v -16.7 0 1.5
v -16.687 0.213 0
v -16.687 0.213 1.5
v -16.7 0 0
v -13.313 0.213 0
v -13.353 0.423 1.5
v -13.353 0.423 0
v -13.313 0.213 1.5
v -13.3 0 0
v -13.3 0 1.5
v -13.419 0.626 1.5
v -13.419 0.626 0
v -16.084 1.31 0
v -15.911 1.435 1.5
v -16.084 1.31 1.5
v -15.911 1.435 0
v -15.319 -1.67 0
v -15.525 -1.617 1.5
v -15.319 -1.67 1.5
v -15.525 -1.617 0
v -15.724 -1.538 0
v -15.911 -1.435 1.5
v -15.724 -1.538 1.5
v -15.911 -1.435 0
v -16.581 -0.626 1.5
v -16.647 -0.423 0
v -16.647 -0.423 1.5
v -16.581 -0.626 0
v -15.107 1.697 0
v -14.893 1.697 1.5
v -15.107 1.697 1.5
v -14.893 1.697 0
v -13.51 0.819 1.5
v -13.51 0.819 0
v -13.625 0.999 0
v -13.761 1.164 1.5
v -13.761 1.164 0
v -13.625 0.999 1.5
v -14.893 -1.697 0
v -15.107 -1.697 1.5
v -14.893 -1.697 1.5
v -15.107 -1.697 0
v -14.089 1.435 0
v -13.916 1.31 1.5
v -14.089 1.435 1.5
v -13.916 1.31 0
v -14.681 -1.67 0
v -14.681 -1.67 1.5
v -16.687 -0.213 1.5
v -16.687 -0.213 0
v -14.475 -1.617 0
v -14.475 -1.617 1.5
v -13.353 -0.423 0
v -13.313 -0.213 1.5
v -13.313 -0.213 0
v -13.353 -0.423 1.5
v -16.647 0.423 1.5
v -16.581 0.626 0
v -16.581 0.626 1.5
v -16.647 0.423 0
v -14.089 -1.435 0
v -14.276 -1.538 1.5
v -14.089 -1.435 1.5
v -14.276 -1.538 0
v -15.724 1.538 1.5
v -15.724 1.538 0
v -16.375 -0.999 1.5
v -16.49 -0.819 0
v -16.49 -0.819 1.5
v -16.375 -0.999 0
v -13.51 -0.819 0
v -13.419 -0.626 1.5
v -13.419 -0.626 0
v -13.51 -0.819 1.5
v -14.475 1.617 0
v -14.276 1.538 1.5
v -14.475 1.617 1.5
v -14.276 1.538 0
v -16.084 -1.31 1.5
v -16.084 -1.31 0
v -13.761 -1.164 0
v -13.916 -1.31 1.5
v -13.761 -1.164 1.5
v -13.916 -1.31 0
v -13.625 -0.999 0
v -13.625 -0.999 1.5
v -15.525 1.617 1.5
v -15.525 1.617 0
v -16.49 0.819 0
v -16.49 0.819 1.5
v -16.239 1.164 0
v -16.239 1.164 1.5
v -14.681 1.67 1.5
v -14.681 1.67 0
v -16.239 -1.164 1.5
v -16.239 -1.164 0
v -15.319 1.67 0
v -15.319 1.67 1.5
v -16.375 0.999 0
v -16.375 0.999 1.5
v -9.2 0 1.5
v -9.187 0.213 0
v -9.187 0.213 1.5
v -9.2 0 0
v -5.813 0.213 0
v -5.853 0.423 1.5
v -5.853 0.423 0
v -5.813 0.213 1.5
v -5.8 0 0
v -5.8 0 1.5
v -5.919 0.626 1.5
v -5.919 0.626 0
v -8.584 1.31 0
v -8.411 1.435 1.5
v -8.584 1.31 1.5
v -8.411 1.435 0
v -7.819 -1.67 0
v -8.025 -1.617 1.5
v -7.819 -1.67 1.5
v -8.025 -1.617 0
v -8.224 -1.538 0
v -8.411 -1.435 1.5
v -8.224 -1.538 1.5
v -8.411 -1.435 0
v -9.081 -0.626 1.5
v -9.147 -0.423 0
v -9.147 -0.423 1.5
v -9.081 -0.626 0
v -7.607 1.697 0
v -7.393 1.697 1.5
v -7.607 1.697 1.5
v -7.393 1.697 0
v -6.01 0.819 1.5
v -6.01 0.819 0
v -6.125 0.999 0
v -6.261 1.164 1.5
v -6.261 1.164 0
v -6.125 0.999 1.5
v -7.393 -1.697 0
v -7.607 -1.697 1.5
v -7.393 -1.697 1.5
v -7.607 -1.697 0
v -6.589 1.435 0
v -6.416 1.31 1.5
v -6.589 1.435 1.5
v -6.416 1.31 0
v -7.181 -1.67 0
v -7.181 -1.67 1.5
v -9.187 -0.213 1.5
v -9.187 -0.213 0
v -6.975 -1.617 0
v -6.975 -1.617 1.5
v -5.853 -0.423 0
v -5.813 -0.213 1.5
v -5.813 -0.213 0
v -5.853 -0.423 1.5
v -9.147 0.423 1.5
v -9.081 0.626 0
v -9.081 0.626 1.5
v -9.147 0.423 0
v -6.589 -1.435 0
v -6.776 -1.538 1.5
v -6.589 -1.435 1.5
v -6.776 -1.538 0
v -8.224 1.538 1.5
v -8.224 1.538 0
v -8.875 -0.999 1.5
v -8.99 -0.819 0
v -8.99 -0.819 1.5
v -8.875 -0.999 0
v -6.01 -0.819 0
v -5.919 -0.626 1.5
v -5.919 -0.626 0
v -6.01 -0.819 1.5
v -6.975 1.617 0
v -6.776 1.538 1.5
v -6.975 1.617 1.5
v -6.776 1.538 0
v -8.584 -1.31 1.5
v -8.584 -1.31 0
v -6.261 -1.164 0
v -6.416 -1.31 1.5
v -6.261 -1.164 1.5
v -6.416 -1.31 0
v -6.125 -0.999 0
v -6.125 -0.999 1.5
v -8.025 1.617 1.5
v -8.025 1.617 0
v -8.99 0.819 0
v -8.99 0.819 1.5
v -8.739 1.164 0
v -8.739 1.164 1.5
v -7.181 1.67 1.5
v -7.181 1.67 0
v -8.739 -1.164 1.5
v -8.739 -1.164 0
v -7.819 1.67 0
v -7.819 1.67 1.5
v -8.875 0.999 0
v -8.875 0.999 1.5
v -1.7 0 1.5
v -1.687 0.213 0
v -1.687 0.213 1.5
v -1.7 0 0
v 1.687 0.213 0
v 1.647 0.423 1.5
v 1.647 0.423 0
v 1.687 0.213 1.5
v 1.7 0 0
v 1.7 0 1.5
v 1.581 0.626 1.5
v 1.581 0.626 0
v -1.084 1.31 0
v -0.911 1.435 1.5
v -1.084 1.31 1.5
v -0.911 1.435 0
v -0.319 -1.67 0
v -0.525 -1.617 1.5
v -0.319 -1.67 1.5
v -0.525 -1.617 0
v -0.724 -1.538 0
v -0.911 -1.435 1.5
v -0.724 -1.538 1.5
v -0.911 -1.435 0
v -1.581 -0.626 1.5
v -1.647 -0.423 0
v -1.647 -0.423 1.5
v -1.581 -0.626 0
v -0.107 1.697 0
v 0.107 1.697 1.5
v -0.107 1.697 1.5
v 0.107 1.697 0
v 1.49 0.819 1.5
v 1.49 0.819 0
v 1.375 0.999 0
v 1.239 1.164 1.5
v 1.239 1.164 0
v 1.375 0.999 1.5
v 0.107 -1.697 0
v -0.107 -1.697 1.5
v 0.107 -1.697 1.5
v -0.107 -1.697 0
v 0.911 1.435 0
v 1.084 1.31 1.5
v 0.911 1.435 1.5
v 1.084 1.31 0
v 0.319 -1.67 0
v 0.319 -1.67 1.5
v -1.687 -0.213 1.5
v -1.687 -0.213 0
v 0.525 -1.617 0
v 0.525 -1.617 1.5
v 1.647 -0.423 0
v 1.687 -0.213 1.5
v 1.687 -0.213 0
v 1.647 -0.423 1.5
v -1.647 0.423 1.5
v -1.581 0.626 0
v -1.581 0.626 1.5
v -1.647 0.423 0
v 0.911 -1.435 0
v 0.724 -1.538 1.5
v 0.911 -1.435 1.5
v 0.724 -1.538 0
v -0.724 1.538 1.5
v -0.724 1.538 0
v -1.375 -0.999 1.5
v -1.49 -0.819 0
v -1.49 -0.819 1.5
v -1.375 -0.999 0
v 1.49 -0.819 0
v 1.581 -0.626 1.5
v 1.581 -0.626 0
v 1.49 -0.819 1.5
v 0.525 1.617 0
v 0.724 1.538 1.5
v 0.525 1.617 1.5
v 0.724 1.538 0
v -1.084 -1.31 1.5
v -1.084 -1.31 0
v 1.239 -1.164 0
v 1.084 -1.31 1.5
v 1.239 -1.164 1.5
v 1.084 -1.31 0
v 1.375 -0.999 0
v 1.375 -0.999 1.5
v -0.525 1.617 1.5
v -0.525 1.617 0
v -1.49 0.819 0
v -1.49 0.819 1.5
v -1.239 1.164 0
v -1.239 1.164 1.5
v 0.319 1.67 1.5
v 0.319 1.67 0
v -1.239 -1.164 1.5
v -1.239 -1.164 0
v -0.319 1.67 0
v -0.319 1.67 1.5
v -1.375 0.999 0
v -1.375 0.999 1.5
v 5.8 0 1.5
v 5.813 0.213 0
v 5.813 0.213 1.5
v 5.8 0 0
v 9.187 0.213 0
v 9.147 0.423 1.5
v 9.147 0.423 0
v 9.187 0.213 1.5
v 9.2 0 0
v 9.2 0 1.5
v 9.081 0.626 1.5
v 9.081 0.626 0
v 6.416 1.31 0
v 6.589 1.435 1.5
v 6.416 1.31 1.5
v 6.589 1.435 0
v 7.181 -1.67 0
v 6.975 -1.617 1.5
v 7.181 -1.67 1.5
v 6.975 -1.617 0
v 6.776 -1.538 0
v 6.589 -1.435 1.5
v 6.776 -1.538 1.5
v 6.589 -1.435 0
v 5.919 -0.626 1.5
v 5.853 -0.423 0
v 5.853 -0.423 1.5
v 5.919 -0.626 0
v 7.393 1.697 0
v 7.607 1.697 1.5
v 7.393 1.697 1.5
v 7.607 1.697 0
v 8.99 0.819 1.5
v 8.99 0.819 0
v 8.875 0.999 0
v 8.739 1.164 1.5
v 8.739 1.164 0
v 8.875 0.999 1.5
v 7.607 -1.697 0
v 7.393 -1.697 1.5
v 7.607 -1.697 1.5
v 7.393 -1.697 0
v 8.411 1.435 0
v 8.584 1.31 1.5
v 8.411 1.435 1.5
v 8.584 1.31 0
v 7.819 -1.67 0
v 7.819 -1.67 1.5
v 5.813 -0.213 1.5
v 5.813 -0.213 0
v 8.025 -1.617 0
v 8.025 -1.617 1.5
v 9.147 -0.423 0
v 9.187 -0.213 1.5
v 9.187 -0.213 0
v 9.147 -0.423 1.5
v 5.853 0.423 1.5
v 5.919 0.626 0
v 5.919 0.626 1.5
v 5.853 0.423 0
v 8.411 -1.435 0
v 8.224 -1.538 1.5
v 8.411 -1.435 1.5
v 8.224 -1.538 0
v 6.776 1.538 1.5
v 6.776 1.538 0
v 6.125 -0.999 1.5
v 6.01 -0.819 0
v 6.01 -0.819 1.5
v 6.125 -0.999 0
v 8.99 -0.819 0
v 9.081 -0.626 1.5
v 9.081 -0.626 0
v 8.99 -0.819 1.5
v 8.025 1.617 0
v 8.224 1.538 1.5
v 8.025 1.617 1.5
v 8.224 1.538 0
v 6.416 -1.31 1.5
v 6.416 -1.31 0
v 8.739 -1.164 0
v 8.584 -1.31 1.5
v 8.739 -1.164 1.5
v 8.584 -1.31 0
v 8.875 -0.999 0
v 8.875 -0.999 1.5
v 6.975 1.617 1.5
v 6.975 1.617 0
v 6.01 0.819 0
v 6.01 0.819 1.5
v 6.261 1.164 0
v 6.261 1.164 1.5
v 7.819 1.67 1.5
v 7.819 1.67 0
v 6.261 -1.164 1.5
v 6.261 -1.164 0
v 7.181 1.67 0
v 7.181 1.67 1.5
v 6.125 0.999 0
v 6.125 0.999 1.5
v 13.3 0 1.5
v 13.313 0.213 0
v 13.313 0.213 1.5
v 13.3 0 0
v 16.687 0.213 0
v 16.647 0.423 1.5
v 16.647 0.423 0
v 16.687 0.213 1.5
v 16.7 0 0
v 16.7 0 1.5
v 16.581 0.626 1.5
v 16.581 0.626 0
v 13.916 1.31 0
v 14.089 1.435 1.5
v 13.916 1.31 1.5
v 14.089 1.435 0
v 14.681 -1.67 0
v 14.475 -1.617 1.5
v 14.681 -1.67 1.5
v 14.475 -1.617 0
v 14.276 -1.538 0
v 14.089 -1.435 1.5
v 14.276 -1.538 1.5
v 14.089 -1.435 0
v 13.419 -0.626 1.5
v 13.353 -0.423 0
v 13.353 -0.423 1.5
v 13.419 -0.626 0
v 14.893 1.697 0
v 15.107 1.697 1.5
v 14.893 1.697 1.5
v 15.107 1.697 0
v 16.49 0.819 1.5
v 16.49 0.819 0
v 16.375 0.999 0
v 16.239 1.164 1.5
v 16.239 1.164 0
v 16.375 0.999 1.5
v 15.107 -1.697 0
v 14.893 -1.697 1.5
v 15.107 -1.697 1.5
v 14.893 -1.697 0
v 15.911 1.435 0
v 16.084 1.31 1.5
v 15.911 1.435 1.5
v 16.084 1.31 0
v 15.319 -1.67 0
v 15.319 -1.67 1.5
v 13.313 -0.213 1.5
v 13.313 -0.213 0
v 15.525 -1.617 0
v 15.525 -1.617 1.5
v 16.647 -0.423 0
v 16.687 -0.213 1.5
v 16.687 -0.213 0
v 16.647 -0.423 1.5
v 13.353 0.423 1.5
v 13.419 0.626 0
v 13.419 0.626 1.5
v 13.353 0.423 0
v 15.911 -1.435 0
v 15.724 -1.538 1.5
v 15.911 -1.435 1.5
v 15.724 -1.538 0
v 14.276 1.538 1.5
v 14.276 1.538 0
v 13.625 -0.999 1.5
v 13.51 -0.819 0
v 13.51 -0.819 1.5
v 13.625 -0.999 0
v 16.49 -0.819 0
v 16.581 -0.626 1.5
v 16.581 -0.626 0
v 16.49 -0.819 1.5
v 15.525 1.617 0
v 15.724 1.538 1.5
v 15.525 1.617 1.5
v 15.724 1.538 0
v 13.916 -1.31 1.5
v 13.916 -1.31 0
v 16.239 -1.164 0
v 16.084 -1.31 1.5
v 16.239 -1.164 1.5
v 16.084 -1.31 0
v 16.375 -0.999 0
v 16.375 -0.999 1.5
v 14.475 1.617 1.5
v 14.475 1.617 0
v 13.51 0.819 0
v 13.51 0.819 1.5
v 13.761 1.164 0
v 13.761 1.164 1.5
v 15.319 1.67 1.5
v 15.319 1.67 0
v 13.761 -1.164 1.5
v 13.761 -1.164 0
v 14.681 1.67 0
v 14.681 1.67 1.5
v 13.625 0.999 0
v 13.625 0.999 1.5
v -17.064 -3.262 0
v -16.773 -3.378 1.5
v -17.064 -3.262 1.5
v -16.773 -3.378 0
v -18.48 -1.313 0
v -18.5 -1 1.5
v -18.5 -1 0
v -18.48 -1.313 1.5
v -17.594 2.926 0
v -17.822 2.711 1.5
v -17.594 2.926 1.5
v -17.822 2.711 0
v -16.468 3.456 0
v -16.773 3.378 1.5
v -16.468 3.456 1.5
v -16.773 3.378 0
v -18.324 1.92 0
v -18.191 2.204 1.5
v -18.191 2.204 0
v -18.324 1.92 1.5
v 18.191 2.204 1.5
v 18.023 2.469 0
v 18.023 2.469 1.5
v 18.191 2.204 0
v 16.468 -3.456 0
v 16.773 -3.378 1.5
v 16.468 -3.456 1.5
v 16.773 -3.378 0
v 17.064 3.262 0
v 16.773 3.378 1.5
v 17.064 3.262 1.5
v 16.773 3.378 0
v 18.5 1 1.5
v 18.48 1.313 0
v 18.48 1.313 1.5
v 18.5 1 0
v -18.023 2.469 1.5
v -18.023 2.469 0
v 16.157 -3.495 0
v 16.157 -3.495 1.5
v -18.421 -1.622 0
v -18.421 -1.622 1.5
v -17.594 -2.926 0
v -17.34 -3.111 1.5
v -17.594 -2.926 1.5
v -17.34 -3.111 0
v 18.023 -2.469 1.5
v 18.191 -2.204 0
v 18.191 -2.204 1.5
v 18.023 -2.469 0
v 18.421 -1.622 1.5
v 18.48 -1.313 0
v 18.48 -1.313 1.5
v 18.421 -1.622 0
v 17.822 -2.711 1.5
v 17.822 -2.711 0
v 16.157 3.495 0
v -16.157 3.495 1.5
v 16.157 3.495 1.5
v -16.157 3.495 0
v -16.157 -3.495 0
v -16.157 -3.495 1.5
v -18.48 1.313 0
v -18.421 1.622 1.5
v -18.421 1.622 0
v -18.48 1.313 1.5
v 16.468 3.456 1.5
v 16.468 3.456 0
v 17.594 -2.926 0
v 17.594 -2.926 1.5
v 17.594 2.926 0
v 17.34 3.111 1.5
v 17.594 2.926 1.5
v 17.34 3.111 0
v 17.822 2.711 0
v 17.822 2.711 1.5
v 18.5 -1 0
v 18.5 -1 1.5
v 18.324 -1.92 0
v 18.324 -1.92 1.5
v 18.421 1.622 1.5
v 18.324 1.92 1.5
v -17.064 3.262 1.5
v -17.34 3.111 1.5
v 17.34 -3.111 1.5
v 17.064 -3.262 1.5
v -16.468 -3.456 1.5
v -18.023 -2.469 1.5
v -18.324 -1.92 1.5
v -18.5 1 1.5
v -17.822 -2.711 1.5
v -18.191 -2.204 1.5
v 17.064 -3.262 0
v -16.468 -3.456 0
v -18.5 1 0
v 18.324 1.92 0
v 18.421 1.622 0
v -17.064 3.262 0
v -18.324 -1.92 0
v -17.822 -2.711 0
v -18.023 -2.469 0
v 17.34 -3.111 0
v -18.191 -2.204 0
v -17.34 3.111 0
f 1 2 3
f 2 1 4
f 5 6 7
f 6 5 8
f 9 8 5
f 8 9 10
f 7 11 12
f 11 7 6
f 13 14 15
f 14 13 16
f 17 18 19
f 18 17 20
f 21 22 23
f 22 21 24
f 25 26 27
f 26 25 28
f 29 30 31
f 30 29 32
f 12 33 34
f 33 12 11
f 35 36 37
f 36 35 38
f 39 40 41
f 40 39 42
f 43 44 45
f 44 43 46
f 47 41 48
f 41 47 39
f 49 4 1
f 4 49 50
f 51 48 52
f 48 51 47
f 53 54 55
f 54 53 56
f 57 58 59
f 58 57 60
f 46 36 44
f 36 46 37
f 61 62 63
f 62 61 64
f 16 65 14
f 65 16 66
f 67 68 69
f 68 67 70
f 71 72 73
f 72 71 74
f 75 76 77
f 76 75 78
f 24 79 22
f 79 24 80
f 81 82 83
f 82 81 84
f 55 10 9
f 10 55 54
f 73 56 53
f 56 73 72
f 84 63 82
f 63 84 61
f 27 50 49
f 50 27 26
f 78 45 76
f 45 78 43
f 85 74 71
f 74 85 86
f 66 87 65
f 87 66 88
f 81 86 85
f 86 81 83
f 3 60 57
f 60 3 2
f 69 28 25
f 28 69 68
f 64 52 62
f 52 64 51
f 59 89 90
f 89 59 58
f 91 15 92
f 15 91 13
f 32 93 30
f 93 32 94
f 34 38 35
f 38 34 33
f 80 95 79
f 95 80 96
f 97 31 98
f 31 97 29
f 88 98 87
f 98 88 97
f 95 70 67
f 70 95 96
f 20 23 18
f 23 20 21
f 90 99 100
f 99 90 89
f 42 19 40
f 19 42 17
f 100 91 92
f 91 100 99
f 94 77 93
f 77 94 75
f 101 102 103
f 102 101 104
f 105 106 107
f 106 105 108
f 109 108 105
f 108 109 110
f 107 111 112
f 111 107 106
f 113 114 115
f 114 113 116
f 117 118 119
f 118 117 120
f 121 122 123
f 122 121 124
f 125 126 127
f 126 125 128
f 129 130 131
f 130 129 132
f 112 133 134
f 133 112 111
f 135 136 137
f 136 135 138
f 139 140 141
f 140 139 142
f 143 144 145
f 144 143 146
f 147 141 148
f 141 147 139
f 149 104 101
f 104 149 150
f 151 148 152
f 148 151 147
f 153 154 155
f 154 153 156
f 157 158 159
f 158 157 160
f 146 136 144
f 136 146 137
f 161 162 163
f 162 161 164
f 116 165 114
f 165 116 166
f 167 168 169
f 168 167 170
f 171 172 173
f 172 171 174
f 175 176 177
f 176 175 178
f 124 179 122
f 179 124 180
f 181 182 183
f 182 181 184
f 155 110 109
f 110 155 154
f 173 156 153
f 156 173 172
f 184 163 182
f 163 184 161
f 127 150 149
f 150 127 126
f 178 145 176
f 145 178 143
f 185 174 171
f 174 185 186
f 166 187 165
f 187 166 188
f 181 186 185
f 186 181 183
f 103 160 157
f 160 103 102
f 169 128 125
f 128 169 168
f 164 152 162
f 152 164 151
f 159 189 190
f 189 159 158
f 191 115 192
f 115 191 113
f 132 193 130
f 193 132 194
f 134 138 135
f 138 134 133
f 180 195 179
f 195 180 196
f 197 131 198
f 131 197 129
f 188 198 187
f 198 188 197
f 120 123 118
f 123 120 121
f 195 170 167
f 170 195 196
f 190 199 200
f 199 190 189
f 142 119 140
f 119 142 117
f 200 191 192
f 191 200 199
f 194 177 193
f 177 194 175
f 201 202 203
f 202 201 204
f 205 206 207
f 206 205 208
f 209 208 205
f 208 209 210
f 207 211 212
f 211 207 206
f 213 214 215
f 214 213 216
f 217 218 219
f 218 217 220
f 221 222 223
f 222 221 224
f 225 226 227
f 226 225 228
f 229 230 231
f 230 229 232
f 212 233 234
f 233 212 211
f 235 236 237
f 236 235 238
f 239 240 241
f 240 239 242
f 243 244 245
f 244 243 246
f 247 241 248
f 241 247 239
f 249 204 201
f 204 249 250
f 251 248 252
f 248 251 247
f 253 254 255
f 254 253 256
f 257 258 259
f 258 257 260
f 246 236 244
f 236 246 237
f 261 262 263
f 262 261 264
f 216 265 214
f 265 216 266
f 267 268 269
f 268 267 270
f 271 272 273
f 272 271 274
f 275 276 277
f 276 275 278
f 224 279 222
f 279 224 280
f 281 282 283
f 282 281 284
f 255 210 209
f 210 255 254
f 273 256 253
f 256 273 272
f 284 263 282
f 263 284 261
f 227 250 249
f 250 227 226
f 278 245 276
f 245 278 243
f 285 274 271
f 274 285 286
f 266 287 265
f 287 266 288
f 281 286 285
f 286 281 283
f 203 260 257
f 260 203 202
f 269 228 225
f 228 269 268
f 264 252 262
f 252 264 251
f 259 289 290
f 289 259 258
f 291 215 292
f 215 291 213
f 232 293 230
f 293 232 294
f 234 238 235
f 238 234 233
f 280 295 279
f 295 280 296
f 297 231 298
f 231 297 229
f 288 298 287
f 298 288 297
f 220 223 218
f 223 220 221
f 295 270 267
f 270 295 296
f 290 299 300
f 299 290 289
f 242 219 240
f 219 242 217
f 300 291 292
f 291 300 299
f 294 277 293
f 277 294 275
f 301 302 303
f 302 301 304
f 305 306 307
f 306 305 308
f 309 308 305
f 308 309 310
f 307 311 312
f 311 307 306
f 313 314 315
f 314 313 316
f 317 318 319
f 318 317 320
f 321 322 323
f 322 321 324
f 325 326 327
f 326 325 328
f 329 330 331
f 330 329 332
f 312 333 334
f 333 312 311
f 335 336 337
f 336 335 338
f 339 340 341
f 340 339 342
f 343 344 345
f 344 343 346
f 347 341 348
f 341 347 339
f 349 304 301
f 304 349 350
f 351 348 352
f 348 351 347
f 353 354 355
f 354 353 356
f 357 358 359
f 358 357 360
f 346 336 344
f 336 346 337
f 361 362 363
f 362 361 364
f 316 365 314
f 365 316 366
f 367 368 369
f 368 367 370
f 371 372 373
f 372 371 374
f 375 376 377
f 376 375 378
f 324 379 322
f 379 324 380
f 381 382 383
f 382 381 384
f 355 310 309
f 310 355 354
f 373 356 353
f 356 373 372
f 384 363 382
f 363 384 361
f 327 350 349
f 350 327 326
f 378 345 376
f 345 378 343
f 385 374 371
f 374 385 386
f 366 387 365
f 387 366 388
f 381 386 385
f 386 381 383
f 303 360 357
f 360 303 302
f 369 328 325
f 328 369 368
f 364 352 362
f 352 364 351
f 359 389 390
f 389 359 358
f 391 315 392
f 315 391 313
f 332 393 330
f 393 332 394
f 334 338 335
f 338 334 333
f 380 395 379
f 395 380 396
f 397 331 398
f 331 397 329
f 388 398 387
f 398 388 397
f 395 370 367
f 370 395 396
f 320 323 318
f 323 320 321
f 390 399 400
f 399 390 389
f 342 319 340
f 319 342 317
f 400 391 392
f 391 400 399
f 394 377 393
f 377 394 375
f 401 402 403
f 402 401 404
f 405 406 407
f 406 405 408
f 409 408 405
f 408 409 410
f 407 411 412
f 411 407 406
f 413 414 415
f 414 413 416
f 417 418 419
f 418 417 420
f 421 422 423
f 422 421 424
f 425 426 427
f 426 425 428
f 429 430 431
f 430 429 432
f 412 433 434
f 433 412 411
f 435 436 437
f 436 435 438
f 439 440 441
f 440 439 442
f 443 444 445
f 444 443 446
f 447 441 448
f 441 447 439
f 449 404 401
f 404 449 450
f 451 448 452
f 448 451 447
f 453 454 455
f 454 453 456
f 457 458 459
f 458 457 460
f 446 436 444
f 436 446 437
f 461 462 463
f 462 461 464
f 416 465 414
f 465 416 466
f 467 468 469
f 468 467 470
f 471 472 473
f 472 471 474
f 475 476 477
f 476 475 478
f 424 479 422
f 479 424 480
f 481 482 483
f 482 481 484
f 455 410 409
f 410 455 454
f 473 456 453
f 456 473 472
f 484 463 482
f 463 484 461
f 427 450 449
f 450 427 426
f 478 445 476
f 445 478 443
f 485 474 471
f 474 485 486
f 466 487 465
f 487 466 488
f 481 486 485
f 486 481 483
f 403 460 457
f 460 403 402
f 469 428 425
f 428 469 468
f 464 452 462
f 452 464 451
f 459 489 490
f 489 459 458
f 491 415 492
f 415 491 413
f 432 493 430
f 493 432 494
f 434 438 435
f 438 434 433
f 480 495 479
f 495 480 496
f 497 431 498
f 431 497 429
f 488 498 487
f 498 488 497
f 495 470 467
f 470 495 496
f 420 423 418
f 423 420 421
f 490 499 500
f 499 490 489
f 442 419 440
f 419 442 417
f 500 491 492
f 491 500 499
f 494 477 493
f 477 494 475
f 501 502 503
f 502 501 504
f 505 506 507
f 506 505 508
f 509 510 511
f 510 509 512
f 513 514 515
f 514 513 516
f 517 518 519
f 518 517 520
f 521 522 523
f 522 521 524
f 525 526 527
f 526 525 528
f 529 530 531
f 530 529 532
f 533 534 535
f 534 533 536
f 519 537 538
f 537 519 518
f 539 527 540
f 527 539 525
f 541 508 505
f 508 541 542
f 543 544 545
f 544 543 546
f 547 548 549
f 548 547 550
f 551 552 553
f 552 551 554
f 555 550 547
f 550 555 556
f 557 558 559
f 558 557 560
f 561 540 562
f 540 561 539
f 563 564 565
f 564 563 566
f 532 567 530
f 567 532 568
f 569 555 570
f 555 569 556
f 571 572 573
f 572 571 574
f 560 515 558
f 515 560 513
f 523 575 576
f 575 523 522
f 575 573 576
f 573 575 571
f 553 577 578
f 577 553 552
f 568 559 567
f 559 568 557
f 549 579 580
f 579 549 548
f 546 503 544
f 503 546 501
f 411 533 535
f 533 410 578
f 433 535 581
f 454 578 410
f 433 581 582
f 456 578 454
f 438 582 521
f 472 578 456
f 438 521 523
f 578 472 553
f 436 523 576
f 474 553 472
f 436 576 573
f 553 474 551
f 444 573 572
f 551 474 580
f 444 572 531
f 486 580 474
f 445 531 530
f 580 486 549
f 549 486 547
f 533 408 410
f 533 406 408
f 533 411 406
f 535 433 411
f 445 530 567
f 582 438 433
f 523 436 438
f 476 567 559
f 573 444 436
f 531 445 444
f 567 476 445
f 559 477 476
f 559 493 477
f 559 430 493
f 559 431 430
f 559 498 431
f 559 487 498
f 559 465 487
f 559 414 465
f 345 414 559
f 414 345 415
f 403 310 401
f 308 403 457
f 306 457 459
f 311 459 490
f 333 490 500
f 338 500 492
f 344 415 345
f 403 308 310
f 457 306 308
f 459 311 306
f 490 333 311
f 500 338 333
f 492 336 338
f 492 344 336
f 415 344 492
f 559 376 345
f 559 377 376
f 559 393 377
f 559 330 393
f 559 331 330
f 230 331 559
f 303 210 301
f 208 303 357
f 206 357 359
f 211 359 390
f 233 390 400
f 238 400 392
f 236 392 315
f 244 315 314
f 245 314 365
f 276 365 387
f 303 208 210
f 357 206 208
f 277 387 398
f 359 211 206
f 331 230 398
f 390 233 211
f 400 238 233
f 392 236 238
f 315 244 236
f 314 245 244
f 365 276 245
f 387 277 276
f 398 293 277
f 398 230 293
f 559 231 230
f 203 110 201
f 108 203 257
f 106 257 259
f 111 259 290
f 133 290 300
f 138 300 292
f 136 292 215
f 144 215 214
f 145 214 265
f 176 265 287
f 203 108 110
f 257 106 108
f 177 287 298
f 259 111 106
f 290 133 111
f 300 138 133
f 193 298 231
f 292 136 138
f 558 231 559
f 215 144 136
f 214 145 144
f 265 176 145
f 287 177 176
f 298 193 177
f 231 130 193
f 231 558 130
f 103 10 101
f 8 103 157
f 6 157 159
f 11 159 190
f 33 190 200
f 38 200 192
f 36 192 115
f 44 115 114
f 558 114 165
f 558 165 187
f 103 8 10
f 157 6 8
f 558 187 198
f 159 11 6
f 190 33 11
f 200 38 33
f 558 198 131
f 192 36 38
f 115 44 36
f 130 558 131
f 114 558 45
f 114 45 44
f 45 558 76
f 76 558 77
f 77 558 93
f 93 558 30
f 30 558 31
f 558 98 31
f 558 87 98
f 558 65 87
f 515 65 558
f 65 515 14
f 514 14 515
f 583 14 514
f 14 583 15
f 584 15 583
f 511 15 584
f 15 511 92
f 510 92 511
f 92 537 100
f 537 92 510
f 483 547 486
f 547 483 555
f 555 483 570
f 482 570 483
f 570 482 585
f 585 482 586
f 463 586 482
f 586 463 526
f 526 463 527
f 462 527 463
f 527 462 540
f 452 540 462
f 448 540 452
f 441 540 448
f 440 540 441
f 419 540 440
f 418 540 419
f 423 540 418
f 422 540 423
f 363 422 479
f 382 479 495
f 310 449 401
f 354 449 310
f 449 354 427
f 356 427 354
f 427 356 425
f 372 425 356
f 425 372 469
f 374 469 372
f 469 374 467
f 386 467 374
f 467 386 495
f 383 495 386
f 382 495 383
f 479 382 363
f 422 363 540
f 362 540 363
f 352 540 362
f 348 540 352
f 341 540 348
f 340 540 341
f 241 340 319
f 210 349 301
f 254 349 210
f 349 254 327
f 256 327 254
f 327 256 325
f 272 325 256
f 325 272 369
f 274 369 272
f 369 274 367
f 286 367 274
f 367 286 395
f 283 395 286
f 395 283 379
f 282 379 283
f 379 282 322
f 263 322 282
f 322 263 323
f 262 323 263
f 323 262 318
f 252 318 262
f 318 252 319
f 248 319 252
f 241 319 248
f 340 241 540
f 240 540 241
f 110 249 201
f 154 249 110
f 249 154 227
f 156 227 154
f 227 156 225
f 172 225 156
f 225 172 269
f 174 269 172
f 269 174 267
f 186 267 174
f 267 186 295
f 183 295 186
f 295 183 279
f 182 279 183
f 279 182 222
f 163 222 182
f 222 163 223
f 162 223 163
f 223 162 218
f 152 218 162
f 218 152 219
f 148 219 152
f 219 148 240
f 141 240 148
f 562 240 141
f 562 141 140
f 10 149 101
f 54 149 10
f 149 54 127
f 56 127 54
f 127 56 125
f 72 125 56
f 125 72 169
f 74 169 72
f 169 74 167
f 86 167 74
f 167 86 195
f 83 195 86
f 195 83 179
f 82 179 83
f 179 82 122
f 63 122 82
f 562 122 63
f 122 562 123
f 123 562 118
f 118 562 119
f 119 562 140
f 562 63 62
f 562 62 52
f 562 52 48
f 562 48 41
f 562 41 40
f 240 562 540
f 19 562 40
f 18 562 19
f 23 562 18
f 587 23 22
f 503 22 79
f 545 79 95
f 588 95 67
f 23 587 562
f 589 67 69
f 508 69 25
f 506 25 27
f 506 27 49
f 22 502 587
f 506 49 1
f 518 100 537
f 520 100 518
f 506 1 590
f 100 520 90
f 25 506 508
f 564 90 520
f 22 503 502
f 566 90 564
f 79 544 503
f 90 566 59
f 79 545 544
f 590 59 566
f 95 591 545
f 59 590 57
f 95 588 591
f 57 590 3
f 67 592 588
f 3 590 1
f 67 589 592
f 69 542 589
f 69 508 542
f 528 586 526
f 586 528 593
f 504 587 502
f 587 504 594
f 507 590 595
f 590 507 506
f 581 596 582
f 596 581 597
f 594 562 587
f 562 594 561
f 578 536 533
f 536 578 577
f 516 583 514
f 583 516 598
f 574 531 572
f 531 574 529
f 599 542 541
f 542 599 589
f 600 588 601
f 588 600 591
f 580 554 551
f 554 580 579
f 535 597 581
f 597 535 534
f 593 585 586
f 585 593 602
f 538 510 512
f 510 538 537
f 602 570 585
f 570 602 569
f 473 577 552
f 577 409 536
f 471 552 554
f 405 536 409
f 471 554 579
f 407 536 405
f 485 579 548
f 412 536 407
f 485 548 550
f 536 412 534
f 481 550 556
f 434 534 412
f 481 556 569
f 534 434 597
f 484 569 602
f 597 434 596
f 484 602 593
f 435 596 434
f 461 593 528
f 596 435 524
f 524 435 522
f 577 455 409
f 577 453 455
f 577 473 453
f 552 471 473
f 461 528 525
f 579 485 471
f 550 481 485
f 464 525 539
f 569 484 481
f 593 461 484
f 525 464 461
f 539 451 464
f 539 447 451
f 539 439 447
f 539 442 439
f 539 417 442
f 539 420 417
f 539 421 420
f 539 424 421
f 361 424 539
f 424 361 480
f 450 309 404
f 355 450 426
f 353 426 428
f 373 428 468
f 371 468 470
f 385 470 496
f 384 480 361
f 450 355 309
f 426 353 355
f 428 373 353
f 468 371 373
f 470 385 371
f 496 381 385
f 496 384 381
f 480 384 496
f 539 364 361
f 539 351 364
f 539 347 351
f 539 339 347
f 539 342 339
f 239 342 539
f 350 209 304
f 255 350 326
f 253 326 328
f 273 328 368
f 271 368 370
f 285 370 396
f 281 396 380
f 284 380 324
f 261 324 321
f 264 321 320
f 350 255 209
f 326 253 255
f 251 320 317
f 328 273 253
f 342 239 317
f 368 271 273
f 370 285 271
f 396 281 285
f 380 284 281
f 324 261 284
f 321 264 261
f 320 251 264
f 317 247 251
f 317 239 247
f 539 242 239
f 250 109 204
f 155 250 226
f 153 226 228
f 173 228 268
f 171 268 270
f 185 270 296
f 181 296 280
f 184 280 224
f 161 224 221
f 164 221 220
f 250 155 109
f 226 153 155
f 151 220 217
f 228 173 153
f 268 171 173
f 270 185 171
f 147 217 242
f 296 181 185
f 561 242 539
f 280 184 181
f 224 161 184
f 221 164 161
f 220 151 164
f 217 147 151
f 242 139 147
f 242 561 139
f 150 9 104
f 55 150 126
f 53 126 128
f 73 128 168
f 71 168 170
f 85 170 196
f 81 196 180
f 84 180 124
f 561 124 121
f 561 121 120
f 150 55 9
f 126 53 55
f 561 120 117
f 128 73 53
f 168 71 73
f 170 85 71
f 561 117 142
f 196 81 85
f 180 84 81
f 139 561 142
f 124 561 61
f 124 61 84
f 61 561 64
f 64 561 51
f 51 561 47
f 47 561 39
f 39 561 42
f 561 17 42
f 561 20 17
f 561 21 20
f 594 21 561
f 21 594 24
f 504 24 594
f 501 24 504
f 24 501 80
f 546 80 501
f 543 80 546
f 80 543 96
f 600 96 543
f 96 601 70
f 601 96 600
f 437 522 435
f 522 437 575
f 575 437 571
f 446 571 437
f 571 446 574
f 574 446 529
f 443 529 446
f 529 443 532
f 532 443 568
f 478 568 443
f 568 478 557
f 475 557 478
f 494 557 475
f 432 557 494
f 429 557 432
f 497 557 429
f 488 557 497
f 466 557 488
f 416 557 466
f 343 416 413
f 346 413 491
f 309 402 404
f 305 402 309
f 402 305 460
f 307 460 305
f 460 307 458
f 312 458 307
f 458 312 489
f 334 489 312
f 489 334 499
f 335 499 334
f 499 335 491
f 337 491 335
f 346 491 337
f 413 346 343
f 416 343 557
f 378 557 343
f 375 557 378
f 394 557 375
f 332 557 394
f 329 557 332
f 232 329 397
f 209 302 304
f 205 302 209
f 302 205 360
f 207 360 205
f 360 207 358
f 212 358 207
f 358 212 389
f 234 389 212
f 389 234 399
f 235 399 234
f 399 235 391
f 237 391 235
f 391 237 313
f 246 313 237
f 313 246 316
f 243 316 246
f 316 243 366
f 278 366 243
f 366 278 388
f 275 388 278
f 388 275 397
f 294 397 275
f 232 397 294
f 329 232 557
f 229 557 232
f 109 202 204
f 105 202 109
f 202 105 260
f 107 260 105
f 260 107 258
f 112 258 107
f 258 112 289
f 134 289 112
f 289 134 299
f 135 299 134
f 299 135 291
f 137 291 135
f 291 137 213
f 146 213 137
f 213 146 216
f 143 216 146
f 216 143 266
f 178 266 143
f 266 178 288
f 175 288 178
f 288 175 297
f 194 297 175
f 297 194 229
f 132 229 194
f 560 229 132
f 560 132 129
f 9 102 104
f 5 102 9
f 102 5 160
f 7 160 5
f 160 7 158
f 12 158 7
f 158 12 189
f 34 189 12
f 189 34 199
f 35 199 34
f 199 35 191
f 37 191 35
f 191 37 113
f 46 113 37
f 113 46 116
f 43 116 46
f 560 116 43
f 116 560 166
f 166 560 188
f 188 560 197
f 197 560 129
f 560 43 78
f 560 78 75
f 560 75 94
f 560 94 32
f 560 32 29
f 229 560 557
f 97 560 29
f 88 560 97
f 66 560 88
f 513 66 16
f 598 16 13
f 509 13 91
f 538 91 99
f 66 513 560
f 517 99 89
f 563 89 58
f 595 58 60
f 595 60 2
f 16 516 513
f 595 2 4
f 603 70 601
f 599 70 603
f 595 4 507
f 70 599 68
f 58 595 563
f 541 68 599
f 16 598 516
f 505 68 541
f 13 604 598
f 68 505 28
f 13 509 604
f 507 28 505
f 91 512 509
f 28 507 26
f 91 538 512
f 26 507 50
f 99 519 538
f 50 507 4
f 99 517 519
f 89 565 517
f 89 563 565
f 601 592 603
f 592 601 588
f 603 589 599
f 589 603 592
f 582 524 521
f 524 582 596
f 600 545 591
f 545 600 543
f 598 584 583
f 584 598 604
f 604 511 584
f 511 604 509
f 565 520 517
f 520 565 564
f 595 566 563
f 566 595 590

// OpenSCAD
$fn = 50;


difference() {
	union() {
		translate(v = [0, 0, 0]) {
			rotate(a = [0, 0, 0]) {
				hull() {
					translate(v = [-16.0000000000, 1.0000000000, 0]) {
						rotate(a = [0, 0, 0]) {
							translate(v = [0, 0, 0]) {
								rotate(a = [0, 0, 0]) {
									cylinder(h = 1.5000000000, r = 2.5000000000);
								}
							}
						}
					}
					translate(v = [16.0000000000, 1.0000000000, 0]) {
						rotate(a = [0, 0, 0]) {
							translate(v = [0, 0, 0]) {
								rotate(a = [0, 0, 0]) {
									cylinder(h = 1.5000000000, r = 2.5000000000);
								}
							}
						}
					}
					translate(v = [-16.0000000000, -1.0000000000, 0]) {
						rotate(a = [0, 0, 0]) {
							translate(v = [0, 0, 0]) {
								rotate(a = [0, 0, 0]) {
									cylinder(h = 1.5000000000, r = 2.5000000000);
								}
							}
						}
					}
					translate(v = [16.0000000000, -1.0000000000, 0]) {
						rotate(a = [0, 0, 0]) {
							translate(v = [0, 0, 0]) {
								rotate(a = [0, 0, 0]) {
									cylinder(h = 1.5000000000, r = 2.5000000000);
								}
							}
						}
					}
				}
			}
		}
	}
	union() {
		translate(v = [-15.0000000000, 0.0000000000, 0]) {
			rotate(a = [0, 0, 0]) {
				translate(v = [0, 0, -50]) {
					rotate(a = [0, 0, 0]) {
						cylinder(h = 100, r = 1.7000000000);
					}
				}
			}
		}
		translate(v = [-7.5000000000, 0.0000000000, 0]) {
			rotate(a = [0, 0, 0]) {
				translate(v = [0, 0, -50]) {
					rotate(a = [0, 0, 0]) {
						cylinder(h = 100, r = 1.7000000000);
					}
				}
			}
		}
		translate(v = [0.0000000000, 0.0000000000, 0]) {
			rotate(a = [0, 0, 0]) {
				translate(v = [0, 0, -50]) {
					rotate(a = [0, 0, 0]) {
						cylinder(h = 100, r = 1.7000000000);
					}
				}
			}
		}
		translate(v = [7.5000000000, 0.0000000000, 0]) {
			rotate(a = [0, 0, 0]) {
				translate(v = [0, 0, -50]) {
					rotate(a = [0, 0, 0]) {
						cylinder(h = 100, r = 1.7000000000);
					}
				}
			}
		}
		translate(v = [15.0000000000, 0.0000000000, 0]) {
			rotate(a = [0, 0, 0]) {
				translate(v = [0, 0, -50]) {
					rotate(a = [0, 0, 0]) {
						cylinder(h = 100, r = 1.7000000000);
					}
				}
			}
		}
	}
}
